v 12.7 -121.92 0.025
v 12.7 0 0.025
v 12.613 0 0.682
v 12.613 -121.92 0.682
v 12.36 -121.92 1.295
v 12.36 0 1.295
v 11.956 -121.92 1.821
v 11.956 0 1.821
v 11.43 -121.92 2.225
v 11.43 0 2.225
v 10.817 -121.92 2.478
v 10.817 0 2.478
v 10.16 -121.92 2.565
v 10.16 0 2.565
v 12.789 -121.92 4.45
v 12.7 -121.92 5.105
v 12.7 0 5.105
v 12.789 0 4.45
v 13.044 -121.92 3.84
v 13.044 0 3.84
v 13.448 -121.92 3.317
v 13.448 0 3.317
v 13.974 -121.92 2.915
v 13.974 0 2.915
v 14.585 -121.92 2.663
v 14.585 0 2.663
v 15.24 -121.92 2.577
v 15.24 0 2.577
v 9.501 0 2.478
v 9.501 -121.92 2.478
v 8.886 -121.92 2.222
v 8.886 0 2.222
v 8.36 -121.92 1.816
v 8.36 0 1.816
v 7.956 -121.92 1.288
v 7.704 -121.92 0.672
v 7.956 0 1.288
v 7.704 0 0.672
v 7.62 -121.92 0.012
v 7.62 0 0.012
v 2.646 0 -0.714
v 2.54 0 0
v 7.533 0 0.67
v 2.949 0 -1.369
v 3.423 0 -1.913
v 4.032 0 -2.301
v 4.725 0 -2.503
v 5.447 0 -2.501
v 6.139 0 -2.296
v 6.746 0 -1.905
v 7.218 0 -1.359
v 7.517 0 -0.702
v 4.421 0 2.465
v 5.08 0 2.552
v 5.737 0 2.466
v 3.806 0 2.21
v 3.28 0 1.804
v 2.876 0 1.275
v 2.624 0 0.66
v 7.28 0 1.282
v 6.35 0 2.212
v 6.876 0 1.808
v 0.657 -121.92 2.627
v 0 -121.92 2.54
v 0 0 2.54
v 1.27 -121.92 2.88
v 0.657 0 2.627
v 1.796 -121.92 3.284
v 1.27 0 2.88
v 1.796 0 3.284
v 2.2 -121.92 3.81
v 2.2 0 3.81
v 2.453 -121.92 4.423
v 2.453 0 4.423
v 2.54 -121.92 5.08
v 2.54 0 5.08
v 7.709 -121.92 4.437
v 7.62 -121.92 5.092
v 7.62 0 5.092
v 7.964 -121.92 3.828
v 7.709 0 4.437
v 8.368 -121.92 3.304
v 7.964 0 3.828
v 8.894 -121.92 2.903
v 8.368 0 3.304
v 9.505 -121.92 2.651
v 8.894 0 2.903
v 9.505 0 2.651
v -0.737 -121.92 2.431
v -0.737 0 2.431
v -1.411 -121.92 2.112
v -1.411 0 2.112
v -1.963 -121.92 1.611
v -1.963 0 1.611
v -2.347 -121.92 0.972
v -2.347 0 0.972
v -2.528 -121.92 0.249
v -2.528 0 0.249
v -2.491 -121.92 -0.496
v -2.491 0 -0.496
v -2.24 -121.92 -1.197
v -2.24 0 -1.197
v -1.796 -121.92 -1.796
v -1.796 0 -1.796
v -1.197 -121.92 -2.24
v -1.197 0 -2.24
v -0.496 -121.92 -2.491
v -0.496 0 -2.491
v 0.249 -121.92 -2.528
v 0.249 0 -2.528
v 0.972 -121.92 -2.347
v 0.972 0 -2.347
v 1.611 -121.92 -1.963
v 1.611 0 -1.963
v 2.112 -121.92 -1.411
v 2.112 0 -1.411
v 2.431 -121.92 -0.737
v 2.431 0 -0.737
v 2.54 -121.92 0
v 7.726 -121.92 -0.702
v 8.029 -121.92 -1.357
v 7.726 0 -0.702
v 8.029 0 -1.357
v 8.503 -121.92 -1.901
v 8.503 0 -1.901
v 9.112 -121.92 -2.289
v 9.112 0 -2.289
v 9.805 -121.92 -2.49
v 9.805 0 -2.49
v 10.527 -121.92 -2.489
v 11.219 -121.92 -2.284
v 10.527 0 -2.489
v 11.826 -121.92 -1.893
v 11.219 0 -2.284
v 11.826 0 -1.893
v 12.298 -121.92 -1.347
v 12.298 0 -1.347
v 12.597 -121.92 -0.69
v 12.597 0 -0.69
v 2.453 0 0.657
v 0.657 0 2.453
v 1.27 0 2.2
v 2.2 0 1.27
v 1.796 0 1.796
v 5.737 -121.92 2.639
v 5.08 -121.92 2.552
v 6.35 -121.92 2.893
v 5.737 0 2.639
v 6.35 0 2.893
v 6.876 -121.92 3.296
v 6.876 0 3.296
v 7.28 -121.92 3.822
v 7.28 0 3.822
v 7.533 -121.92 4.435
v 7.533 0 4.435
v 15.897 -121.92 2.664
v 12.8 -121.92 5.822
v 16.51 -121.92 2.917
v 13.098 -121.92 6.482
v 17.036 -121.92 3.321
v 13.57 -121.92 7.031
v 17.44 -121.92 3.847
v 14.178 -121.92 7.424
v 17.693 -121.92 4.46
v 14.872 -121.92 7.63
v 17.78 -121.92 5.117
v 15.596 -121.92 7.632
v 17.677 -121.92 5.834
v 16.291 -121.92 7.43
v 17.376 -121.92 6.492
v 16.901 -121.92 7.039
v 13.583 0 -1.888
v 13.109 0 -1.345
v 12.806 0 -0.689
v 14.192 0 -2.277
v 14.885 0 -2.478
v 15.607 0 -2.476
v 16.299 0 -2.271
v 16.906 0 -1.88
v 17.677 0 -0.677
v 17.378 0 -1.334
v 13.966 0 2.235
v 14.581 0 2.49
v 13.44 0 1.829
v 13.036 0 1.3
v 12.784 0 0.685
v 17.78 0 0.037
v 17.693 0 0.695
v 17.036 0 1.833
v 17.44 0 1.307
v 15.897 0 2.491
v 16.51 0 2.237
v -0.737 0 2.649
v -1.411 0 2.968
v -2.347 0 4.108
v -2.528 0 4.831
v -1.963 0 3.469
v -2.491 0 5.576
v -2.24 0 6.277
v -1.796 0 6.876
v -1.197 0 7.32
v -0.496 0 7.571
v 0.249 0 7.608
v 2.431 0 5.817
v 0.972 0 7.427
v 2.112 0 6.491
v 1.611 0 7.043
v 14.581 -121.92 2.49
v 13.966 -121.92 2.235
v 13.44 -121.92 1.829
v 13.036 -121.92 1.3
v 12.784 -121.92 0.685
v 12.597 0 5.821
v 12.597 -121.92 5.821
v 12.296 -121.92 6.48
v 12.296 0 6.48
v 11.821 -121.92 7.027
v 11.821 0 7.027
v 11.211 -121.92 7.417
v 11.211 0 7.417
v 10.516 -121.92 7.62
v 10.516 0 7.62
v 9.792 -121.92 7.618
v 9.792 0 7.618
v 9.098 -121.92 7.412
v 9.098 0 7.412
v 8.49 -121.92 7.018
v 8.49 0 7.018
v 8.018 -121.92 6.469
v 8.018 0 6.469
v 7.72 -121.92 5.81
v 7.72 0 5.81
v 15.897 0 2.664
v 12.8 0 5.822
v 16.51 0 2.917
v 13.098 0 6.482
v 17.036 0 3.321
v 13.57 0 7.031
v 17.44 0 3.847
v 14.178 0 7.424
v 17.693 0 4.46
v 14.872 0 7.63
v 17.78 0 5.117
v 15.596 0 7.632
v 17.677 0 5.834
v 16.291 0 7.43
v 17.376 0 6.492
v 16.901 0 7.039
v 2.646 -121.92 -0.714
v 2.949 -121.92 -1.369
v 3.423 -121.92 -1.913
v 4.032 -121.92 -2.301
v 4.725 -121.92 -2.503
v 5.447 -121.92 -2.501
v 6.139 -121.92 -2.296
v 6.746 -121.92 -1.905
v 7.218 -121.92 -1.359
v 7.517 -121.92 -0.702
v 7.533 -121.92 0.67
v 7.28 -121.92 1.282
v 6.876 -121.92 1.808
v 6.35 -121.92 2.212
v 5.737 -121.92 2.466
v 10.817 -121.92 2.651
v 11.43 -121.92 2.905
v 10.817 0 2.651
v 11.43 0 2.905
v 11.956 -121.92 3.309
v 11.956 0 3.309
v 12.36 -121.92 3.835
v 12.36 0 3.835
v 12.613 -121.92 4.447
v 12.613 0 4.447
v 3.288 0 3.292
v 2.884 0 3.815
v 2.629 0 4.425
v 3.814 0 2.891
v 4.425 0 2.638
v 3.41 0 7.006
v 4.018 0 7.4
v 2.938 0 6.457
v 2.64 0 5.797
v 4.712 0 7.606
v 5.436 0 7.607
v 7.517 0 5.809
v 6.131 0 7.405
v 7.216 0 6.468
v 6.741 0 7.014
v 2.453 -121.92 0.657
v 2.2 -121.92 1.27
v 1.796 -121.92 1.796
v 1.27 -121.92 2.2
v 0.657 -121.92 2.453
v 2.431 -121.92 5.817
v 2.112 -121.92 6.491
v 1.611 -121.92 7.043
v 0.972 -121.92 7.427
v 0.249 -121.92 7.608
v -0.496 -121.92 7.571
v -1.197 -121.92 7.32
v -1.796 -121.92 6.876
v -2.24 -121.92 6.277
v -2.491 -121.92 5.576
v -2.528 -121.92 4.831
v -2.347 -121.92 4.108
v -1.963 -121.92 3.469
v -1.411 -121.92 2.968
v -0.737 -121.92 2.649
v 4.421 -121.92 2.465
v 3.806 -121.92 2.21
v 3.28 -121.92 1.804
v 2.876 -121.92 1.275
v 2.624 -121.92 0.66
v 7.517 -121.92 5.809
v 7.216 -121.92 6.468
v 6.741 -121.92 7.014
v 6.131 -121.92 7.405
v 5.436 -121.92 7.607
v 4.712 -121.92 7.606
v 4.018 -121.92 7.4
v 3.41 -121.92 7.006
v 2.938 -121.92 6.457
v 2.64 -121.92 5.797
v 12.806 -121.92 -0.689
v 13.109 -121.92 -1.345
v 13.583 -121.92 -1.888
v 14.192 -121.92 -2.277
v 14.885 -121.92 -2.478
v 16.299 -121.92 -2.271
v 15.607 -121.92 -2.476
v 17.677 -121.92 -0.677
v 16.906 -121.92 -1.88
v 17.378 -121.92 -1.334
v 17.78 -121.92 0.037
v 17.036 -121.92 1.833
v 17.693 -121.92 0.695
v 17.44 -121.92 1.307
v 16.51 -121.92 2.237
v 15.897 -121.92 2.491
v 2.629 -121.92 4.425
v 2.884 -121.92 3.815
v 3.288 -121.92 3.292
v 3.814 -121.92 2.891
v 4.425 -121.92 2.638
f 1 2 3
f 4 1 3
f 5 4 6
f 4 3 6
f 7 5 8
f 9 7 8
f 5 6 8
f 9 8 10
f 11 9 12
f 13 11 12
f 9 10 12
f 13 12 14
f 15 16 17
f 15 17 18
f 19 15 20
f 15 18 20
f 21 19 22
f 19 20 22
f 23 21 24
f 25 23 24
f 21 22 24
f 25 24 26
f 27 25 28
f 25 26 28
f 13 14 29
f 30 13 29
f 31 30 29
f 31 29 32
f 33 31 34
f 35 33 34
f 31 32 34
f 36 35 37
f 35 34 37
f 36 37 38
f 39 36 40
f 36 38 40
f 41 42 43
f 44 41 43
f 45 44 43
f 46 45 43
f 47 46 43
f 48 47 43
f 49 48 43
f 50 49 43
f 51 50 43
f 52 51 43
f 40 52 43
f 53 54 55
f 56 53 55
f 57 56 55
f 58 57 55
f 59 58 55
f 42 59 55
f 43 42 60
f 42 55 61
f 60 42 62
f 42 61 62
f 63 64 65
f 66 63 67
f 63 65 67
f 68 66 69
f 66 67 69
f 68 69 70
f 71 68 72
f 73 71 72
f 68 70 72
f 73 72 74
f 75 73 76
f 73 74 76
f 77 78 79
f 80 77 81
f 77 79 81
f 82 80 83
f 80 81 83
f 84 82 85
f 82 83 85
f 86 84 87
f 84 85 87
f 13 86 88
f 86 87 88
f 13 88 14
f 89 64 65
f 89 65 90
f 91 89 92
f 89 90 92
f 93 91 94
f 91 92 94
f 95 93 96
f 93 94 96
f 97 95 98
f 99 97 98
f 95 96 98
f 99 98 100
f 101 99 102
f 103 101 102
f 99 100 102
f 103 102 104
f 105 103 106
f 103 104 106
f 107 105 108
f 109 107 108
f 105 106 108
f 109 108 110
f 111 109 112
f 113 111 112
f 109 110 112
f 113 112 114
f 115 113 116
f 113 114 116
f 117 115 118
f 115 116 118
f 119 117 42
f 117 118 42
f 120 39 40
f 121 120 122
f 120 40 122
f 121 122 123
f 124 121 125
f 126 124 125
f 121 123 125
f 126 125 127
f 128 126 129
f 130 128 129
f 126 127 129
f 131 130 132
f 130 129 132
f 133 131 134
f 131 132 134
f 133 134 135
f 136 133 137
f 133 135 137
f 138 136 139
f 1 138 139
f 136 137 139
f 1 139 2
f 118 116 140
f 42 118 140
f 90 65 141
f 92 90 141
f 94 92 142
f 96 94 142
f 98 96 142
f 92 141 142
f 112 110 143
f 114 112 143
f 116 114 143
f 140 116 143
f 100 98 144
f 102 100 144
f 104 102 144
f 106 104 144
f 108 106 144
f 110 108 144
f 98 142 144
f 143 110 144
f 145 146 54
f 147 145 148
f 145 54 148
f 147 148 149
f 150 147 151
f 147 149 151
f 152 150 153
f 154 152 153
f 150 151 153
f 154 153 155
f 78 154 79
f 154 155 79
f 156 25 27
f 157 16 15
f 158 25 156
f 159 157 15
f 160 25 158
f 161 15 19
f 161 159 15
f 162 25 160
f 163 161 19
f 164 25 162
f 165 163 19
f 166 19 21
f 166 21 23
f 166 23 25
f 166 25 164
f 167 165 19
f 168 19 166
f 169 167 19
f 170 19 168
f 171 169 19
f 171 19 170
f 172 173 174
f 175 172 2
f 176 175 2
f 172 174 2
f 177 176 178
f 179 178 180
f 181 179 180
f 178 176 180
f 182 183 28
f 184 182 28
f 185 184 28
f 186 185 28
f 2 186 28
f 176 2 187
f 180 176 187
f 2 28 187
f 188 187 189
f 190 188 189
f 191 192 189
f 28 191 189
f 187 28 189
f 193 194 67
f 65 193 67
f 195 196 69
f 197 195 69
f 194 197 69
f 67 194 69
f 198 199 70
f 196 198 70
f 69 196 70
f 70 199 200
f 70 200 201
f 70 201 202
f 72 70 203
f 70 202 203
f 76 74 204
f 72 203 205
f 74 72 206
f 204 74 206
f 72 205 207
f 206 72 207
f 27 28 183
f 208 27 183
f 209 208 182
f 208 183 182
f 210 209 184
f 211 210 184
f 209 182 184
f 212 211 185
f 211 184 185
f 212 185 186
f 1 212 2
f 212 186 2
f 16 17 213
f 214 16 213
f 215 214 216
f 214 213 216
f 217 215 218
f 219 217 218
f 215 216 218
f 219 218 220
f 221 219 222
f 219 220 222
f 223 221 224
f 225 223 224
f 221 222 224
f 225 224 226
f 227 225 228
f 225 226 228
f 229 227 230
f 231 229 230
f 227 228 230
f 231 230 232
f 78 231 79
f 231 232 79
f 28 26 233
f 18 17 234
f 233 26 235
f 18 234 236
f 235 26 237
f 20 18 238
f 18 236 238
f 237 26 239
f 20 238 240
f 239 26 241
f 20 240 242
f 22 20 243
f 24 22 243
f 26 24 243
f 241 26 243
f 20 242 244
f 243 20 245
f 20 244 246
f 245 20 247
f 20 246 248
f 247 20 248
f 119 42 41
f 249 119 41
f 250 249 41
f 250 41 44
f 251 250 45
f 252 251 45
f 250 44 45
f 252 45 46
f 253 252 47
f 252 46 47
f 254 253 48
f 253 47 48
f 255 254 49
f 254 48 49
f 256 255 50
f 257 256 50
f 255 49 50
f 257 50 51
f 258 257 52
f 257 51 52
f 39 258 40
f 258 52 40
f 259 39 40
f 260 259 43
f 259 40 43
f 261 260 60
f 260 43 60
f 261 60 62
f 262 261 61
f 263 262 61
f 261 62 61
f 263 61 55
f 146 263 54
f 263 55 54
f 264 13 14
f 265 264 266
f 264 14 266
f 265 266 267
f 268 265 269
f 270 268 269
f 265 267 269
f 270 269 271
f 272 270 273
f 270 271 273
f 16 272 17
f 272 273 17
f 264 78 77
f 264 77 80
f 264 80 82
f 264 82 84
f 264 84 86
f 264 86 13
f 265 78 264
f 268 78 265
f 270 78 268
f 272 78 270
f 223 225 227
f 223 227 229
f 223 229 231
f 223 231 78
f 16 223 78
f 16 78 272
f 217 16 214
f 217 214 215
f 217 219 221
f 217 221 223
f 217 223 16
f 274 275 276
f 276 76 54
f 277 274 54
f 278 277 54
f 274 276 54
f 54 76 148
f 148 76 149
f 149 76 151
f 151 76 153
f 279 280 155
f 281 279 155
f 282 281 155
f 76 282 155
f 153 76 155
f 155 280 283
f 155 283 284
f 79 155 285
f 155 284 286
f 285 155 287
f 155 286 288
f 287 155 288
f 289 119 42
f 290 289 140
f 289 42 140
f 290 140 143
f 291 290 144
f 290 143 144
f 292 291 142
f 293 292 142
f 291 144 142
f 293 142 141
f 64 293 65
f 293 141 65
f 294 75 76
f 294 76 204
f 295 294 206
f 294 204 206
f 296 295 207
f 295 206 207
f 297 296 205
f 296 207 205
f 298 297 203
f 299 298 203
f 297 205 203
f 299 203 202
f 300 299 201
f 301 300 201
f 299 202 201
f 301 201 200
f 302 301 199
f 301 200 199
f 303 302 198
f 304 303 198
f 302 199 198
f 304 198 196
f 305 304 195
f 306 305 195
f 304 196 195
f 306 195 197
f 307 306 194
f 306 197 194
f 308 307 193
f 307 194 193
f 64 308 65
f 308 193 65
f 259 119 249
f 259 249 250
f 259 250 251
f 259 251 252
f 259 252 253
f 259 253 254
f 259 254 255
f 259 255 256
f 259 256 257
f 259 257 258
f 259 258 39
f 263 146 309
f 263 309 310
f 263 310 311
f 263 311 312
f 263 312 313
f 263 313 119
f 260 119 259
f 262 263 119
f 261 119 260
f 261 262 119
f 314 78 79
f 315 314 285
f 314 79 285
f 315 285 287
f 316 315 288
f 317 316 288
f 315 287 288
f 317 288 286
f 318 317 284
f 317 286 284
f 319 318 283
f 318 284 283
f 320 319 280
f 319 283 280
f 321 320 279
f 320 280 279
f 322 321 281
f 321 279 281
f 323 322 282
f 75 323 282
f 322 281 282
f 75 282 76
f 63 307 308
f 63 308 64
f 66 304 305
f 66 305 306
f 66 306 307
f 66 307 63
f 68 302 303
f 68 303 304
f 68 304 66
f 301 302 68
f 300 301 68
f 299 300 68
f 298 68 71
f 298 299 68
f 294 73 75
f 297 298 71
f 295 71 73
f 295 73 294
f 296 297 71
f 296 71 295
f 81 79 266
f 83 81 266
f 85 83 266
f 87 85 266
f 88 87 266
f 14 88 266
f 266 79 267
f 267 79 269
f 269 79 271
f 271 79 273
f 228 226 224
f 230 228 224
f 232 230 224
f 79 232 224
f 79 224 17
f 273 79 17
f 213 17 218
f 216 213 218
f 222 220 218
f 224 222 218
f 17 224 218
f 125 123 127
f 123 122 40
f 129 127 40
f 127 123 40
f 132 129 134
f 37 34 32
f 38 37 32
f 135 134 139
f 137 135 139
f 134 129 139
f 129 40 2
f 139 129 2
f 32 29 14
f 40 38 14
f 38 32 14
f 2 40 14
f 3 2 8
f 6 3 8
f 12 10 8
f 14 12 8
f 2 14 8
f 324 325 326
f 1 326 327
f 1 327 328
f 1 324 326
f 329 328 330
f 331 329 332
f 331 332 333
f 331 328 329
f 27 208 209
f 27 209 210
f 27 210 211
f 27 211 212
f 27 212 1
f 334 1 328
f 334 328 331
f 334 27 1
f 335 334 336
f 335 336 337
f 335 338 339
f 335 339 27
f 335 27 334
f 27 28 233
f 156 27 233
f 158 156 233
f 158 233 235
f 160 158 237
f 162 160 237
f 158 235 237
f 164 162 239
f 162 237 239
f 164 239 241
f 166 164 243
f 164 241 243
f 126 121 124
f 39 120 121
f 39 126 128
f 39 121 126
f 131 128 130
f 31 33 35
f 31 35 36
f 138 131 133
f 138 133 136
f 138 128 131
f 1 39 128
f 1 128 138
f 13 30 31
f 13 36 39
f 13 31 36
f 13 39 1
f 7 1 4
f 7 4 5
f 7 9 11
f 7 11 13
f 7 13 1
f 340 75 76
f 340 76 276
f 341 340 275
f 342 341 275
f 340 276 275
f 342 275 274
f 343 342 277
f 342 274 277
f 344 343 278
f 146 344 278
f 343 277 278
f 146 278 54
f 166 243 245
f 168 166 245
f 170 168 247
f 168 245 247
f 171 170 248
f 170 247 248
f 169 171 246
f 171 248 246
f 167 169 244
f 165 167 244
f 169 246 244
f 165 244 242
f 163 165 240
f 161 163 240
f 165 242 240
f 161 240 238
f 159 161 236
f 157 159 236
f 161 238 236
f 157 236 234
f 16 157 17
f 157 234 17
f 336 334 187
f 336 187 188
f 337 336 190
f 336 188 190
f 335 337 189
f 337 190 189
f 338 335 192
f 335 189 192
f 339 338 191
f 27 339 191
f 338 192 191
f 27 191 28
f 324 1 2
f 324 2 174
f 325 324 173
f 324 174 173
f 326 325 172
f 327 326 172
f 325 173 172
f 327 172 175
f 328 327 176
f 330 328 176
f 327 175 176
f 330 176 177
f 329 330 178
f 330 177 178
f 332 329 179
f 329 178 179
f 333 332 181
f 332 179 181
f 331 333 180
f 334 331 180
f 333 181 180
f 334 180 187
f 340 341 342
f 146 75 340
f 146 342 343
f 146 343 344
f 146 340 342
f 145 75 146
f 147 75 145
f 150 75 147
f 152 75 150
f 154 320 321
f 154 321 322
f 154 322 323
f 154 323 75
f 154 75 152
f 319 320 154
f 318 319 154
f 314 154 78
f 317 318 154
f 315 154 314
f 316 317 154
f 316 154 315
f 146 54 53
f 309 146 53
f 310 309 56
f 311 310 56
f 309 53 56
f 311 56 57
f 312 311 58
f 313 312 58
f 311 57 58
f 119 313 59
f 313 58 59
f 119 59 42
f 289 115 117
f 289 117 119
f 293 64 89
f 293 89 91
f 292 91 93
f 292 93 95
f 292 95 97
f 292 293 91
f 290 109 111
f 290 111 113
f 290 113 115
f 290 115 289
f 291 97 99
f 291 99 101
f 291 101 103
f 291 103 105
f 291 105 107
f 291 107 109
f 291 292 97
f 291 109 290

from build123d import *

# Parameters (mm, degrees)
F1_DEPTH = 121.92


with BuildPart() as f1:
    # F0 (on Front) → F1 (new body)
    with BuildSketch(Plane.XZ):
        with BuildLine():
            ThreePointArc((0, 2.54), (-1.7960512242, -1.7960512242), (2.54, 0))
            ThreePointArc((2.54, 0), (1.7960512242, 1.7960512242), (0, 2.54))
        make_face()
    extrude(amount=F1_DEPTH)


with BuildPart() as f1b:
    # F0 (on Front) → F1, piece 2 (new body)
    with BuildSketch(Plane.XZ):
        with BuildLine():
            ThreePointArc((2.54, 5.08), (-1.7960512242, 6.8760512242), (0, 2.54))
            ThreePointArc((0, 2.54), (1.7960512242, 3.2839487758), (2.54, 5.08))
        make_face()
    extrude(amount=F1_DEPTH)


with BuildPart() as f1c:
    # F0 (on Front) → F1, piece 3 (new body)
    with BuildSketch(Plane.XZ):
        with BuildLine():
            ThreePointArc((15.2399545881, 2.577204187), (13.4395241733, 1.828865517), (12.6999848625, 0.0248028653))
            ThreePointArc((12.6999848625, 0.0248028653), (15.2461552675, -2.5027882444), (17.7799545881, 0.037204187))
            ThreePointArc((17.7799545881, 0.037204187), (17.0360058124, 1.8332554112), (15.2399545881, 2.577204187))
        make_face()
    extrude(amount=F1_DEPTH)


with BuildPart() as f1d:
    # F0 (on Front) → F1, piece 4 (new body)
    with BuildSketch(Plane.XZ):
        with BuildLine():
            ThreePointArc((12.6999848625, 5.1048028653), (13.4482932582, 3.3167737722), (15.2399545881, 2.577204187))
            ThreePointArc((15.2399545881, 2.577204187), (17.0360058124, 3.3211529628), (17.7799545881, 5.117204187))
            ThreePointArc((17.7799545881, 5.117204187), (15.2337539088, 7.6571966184), (12.6999848625, 5.1048028653))
        make_face()
    extrude(amount=F1_DEPTH)


with BuildPart() as f1e:
    # F0 (on Front) → F1, piece 5 (new body)
    with BuildSketch(Plane.XZ):
        with BuildLine():
            ThreePointArc((5.0799848627, 2.5524013957), (3.2795544479, 1.8040627257), (2.5400151371, 7.39e-08))
            ThreePointArc((2.5400151371, 7.39e-08), (5.0861855421, -2.5275910357), (7.6199848627, 0.0124013957))
            ThreePointArc((7.6199848627, 0.0124013957), (6.8760360869, 1.8084526199), (5.0799848627, 2.5524013957))
        make_face()
    extrude(amount=F1_DEPTH)


with BuildPart() as f1f:
    # F0 (on Front) → F1, piece 6 (new body)
    with BuildSketch(Plane.XZ):
        with BuildLine():
            ThreePointArc((2.5400151371, 5.0800000739), (3.2883235327, 3.2919709808), (5.0799848627, 2.5524013957))
            ThreePointArc((5.0799848627, 2.5524013957), (6.8760360869, 3.2963501715), (7.6199848627, 5.0924013957))
            ThreePointArc((7.6199848627, 5.0924013957), (5.0737841834, 7.6323938271), (2.5400151371, 5.0800000739))
        make_face()
    extrude(amount=F1_DEPTH)


with BuildPart() as f1g:
    # F0 (on Front) → F1, piece 7 (new body)
    with BuildSketch(Plane.XZ):
        with BuildLine():
            ThreePointArc((10.1599697254, 2.5648027913), (8.3595393106, 1.8164641213), (7.6199999998, 0.0124014696))
            ThreePointArc((7.6199999998, 0.0124014696), (10.1661704048, -2.5151896401), (12.6999697254, 0.0248027913))
            ThreePointArc((12.6999697254, 0.0248027913), (11.9560209496, 1.8208540156), (10.1599697254, 2.5648027913))
        make_face()
    extrude(amount=F1_DEPTH)


with BuildPart() as f1h:
    # F0 (on Front) → F1, piece 8 (new body)
    with BuildSketch(Plane.XZ):
        with BuildLine():
            ThreePointArc((7.6199999998, 5.0924014696), (8.3683083954, 3.3043723765), (10.1599697254, 2.5648027913))
            ThreePointArc((10.1599697254, 2.5648027913), (11.9560209496, 3.3087515671), (12.6999697254, 5.1048027913))
            ThreePointArc((12.6999697254, 5.1048027913), (10.1537690461, 7.6447952228), (7.6199999998, 5.0924014696))
        make_face()
    extrude(amount=F1_DEPTH)


solid = Compound([f1.part, f1b.part, f1c.part, f1d.part, f1e.part, f1f.part, f1g.part, f1h.part])
